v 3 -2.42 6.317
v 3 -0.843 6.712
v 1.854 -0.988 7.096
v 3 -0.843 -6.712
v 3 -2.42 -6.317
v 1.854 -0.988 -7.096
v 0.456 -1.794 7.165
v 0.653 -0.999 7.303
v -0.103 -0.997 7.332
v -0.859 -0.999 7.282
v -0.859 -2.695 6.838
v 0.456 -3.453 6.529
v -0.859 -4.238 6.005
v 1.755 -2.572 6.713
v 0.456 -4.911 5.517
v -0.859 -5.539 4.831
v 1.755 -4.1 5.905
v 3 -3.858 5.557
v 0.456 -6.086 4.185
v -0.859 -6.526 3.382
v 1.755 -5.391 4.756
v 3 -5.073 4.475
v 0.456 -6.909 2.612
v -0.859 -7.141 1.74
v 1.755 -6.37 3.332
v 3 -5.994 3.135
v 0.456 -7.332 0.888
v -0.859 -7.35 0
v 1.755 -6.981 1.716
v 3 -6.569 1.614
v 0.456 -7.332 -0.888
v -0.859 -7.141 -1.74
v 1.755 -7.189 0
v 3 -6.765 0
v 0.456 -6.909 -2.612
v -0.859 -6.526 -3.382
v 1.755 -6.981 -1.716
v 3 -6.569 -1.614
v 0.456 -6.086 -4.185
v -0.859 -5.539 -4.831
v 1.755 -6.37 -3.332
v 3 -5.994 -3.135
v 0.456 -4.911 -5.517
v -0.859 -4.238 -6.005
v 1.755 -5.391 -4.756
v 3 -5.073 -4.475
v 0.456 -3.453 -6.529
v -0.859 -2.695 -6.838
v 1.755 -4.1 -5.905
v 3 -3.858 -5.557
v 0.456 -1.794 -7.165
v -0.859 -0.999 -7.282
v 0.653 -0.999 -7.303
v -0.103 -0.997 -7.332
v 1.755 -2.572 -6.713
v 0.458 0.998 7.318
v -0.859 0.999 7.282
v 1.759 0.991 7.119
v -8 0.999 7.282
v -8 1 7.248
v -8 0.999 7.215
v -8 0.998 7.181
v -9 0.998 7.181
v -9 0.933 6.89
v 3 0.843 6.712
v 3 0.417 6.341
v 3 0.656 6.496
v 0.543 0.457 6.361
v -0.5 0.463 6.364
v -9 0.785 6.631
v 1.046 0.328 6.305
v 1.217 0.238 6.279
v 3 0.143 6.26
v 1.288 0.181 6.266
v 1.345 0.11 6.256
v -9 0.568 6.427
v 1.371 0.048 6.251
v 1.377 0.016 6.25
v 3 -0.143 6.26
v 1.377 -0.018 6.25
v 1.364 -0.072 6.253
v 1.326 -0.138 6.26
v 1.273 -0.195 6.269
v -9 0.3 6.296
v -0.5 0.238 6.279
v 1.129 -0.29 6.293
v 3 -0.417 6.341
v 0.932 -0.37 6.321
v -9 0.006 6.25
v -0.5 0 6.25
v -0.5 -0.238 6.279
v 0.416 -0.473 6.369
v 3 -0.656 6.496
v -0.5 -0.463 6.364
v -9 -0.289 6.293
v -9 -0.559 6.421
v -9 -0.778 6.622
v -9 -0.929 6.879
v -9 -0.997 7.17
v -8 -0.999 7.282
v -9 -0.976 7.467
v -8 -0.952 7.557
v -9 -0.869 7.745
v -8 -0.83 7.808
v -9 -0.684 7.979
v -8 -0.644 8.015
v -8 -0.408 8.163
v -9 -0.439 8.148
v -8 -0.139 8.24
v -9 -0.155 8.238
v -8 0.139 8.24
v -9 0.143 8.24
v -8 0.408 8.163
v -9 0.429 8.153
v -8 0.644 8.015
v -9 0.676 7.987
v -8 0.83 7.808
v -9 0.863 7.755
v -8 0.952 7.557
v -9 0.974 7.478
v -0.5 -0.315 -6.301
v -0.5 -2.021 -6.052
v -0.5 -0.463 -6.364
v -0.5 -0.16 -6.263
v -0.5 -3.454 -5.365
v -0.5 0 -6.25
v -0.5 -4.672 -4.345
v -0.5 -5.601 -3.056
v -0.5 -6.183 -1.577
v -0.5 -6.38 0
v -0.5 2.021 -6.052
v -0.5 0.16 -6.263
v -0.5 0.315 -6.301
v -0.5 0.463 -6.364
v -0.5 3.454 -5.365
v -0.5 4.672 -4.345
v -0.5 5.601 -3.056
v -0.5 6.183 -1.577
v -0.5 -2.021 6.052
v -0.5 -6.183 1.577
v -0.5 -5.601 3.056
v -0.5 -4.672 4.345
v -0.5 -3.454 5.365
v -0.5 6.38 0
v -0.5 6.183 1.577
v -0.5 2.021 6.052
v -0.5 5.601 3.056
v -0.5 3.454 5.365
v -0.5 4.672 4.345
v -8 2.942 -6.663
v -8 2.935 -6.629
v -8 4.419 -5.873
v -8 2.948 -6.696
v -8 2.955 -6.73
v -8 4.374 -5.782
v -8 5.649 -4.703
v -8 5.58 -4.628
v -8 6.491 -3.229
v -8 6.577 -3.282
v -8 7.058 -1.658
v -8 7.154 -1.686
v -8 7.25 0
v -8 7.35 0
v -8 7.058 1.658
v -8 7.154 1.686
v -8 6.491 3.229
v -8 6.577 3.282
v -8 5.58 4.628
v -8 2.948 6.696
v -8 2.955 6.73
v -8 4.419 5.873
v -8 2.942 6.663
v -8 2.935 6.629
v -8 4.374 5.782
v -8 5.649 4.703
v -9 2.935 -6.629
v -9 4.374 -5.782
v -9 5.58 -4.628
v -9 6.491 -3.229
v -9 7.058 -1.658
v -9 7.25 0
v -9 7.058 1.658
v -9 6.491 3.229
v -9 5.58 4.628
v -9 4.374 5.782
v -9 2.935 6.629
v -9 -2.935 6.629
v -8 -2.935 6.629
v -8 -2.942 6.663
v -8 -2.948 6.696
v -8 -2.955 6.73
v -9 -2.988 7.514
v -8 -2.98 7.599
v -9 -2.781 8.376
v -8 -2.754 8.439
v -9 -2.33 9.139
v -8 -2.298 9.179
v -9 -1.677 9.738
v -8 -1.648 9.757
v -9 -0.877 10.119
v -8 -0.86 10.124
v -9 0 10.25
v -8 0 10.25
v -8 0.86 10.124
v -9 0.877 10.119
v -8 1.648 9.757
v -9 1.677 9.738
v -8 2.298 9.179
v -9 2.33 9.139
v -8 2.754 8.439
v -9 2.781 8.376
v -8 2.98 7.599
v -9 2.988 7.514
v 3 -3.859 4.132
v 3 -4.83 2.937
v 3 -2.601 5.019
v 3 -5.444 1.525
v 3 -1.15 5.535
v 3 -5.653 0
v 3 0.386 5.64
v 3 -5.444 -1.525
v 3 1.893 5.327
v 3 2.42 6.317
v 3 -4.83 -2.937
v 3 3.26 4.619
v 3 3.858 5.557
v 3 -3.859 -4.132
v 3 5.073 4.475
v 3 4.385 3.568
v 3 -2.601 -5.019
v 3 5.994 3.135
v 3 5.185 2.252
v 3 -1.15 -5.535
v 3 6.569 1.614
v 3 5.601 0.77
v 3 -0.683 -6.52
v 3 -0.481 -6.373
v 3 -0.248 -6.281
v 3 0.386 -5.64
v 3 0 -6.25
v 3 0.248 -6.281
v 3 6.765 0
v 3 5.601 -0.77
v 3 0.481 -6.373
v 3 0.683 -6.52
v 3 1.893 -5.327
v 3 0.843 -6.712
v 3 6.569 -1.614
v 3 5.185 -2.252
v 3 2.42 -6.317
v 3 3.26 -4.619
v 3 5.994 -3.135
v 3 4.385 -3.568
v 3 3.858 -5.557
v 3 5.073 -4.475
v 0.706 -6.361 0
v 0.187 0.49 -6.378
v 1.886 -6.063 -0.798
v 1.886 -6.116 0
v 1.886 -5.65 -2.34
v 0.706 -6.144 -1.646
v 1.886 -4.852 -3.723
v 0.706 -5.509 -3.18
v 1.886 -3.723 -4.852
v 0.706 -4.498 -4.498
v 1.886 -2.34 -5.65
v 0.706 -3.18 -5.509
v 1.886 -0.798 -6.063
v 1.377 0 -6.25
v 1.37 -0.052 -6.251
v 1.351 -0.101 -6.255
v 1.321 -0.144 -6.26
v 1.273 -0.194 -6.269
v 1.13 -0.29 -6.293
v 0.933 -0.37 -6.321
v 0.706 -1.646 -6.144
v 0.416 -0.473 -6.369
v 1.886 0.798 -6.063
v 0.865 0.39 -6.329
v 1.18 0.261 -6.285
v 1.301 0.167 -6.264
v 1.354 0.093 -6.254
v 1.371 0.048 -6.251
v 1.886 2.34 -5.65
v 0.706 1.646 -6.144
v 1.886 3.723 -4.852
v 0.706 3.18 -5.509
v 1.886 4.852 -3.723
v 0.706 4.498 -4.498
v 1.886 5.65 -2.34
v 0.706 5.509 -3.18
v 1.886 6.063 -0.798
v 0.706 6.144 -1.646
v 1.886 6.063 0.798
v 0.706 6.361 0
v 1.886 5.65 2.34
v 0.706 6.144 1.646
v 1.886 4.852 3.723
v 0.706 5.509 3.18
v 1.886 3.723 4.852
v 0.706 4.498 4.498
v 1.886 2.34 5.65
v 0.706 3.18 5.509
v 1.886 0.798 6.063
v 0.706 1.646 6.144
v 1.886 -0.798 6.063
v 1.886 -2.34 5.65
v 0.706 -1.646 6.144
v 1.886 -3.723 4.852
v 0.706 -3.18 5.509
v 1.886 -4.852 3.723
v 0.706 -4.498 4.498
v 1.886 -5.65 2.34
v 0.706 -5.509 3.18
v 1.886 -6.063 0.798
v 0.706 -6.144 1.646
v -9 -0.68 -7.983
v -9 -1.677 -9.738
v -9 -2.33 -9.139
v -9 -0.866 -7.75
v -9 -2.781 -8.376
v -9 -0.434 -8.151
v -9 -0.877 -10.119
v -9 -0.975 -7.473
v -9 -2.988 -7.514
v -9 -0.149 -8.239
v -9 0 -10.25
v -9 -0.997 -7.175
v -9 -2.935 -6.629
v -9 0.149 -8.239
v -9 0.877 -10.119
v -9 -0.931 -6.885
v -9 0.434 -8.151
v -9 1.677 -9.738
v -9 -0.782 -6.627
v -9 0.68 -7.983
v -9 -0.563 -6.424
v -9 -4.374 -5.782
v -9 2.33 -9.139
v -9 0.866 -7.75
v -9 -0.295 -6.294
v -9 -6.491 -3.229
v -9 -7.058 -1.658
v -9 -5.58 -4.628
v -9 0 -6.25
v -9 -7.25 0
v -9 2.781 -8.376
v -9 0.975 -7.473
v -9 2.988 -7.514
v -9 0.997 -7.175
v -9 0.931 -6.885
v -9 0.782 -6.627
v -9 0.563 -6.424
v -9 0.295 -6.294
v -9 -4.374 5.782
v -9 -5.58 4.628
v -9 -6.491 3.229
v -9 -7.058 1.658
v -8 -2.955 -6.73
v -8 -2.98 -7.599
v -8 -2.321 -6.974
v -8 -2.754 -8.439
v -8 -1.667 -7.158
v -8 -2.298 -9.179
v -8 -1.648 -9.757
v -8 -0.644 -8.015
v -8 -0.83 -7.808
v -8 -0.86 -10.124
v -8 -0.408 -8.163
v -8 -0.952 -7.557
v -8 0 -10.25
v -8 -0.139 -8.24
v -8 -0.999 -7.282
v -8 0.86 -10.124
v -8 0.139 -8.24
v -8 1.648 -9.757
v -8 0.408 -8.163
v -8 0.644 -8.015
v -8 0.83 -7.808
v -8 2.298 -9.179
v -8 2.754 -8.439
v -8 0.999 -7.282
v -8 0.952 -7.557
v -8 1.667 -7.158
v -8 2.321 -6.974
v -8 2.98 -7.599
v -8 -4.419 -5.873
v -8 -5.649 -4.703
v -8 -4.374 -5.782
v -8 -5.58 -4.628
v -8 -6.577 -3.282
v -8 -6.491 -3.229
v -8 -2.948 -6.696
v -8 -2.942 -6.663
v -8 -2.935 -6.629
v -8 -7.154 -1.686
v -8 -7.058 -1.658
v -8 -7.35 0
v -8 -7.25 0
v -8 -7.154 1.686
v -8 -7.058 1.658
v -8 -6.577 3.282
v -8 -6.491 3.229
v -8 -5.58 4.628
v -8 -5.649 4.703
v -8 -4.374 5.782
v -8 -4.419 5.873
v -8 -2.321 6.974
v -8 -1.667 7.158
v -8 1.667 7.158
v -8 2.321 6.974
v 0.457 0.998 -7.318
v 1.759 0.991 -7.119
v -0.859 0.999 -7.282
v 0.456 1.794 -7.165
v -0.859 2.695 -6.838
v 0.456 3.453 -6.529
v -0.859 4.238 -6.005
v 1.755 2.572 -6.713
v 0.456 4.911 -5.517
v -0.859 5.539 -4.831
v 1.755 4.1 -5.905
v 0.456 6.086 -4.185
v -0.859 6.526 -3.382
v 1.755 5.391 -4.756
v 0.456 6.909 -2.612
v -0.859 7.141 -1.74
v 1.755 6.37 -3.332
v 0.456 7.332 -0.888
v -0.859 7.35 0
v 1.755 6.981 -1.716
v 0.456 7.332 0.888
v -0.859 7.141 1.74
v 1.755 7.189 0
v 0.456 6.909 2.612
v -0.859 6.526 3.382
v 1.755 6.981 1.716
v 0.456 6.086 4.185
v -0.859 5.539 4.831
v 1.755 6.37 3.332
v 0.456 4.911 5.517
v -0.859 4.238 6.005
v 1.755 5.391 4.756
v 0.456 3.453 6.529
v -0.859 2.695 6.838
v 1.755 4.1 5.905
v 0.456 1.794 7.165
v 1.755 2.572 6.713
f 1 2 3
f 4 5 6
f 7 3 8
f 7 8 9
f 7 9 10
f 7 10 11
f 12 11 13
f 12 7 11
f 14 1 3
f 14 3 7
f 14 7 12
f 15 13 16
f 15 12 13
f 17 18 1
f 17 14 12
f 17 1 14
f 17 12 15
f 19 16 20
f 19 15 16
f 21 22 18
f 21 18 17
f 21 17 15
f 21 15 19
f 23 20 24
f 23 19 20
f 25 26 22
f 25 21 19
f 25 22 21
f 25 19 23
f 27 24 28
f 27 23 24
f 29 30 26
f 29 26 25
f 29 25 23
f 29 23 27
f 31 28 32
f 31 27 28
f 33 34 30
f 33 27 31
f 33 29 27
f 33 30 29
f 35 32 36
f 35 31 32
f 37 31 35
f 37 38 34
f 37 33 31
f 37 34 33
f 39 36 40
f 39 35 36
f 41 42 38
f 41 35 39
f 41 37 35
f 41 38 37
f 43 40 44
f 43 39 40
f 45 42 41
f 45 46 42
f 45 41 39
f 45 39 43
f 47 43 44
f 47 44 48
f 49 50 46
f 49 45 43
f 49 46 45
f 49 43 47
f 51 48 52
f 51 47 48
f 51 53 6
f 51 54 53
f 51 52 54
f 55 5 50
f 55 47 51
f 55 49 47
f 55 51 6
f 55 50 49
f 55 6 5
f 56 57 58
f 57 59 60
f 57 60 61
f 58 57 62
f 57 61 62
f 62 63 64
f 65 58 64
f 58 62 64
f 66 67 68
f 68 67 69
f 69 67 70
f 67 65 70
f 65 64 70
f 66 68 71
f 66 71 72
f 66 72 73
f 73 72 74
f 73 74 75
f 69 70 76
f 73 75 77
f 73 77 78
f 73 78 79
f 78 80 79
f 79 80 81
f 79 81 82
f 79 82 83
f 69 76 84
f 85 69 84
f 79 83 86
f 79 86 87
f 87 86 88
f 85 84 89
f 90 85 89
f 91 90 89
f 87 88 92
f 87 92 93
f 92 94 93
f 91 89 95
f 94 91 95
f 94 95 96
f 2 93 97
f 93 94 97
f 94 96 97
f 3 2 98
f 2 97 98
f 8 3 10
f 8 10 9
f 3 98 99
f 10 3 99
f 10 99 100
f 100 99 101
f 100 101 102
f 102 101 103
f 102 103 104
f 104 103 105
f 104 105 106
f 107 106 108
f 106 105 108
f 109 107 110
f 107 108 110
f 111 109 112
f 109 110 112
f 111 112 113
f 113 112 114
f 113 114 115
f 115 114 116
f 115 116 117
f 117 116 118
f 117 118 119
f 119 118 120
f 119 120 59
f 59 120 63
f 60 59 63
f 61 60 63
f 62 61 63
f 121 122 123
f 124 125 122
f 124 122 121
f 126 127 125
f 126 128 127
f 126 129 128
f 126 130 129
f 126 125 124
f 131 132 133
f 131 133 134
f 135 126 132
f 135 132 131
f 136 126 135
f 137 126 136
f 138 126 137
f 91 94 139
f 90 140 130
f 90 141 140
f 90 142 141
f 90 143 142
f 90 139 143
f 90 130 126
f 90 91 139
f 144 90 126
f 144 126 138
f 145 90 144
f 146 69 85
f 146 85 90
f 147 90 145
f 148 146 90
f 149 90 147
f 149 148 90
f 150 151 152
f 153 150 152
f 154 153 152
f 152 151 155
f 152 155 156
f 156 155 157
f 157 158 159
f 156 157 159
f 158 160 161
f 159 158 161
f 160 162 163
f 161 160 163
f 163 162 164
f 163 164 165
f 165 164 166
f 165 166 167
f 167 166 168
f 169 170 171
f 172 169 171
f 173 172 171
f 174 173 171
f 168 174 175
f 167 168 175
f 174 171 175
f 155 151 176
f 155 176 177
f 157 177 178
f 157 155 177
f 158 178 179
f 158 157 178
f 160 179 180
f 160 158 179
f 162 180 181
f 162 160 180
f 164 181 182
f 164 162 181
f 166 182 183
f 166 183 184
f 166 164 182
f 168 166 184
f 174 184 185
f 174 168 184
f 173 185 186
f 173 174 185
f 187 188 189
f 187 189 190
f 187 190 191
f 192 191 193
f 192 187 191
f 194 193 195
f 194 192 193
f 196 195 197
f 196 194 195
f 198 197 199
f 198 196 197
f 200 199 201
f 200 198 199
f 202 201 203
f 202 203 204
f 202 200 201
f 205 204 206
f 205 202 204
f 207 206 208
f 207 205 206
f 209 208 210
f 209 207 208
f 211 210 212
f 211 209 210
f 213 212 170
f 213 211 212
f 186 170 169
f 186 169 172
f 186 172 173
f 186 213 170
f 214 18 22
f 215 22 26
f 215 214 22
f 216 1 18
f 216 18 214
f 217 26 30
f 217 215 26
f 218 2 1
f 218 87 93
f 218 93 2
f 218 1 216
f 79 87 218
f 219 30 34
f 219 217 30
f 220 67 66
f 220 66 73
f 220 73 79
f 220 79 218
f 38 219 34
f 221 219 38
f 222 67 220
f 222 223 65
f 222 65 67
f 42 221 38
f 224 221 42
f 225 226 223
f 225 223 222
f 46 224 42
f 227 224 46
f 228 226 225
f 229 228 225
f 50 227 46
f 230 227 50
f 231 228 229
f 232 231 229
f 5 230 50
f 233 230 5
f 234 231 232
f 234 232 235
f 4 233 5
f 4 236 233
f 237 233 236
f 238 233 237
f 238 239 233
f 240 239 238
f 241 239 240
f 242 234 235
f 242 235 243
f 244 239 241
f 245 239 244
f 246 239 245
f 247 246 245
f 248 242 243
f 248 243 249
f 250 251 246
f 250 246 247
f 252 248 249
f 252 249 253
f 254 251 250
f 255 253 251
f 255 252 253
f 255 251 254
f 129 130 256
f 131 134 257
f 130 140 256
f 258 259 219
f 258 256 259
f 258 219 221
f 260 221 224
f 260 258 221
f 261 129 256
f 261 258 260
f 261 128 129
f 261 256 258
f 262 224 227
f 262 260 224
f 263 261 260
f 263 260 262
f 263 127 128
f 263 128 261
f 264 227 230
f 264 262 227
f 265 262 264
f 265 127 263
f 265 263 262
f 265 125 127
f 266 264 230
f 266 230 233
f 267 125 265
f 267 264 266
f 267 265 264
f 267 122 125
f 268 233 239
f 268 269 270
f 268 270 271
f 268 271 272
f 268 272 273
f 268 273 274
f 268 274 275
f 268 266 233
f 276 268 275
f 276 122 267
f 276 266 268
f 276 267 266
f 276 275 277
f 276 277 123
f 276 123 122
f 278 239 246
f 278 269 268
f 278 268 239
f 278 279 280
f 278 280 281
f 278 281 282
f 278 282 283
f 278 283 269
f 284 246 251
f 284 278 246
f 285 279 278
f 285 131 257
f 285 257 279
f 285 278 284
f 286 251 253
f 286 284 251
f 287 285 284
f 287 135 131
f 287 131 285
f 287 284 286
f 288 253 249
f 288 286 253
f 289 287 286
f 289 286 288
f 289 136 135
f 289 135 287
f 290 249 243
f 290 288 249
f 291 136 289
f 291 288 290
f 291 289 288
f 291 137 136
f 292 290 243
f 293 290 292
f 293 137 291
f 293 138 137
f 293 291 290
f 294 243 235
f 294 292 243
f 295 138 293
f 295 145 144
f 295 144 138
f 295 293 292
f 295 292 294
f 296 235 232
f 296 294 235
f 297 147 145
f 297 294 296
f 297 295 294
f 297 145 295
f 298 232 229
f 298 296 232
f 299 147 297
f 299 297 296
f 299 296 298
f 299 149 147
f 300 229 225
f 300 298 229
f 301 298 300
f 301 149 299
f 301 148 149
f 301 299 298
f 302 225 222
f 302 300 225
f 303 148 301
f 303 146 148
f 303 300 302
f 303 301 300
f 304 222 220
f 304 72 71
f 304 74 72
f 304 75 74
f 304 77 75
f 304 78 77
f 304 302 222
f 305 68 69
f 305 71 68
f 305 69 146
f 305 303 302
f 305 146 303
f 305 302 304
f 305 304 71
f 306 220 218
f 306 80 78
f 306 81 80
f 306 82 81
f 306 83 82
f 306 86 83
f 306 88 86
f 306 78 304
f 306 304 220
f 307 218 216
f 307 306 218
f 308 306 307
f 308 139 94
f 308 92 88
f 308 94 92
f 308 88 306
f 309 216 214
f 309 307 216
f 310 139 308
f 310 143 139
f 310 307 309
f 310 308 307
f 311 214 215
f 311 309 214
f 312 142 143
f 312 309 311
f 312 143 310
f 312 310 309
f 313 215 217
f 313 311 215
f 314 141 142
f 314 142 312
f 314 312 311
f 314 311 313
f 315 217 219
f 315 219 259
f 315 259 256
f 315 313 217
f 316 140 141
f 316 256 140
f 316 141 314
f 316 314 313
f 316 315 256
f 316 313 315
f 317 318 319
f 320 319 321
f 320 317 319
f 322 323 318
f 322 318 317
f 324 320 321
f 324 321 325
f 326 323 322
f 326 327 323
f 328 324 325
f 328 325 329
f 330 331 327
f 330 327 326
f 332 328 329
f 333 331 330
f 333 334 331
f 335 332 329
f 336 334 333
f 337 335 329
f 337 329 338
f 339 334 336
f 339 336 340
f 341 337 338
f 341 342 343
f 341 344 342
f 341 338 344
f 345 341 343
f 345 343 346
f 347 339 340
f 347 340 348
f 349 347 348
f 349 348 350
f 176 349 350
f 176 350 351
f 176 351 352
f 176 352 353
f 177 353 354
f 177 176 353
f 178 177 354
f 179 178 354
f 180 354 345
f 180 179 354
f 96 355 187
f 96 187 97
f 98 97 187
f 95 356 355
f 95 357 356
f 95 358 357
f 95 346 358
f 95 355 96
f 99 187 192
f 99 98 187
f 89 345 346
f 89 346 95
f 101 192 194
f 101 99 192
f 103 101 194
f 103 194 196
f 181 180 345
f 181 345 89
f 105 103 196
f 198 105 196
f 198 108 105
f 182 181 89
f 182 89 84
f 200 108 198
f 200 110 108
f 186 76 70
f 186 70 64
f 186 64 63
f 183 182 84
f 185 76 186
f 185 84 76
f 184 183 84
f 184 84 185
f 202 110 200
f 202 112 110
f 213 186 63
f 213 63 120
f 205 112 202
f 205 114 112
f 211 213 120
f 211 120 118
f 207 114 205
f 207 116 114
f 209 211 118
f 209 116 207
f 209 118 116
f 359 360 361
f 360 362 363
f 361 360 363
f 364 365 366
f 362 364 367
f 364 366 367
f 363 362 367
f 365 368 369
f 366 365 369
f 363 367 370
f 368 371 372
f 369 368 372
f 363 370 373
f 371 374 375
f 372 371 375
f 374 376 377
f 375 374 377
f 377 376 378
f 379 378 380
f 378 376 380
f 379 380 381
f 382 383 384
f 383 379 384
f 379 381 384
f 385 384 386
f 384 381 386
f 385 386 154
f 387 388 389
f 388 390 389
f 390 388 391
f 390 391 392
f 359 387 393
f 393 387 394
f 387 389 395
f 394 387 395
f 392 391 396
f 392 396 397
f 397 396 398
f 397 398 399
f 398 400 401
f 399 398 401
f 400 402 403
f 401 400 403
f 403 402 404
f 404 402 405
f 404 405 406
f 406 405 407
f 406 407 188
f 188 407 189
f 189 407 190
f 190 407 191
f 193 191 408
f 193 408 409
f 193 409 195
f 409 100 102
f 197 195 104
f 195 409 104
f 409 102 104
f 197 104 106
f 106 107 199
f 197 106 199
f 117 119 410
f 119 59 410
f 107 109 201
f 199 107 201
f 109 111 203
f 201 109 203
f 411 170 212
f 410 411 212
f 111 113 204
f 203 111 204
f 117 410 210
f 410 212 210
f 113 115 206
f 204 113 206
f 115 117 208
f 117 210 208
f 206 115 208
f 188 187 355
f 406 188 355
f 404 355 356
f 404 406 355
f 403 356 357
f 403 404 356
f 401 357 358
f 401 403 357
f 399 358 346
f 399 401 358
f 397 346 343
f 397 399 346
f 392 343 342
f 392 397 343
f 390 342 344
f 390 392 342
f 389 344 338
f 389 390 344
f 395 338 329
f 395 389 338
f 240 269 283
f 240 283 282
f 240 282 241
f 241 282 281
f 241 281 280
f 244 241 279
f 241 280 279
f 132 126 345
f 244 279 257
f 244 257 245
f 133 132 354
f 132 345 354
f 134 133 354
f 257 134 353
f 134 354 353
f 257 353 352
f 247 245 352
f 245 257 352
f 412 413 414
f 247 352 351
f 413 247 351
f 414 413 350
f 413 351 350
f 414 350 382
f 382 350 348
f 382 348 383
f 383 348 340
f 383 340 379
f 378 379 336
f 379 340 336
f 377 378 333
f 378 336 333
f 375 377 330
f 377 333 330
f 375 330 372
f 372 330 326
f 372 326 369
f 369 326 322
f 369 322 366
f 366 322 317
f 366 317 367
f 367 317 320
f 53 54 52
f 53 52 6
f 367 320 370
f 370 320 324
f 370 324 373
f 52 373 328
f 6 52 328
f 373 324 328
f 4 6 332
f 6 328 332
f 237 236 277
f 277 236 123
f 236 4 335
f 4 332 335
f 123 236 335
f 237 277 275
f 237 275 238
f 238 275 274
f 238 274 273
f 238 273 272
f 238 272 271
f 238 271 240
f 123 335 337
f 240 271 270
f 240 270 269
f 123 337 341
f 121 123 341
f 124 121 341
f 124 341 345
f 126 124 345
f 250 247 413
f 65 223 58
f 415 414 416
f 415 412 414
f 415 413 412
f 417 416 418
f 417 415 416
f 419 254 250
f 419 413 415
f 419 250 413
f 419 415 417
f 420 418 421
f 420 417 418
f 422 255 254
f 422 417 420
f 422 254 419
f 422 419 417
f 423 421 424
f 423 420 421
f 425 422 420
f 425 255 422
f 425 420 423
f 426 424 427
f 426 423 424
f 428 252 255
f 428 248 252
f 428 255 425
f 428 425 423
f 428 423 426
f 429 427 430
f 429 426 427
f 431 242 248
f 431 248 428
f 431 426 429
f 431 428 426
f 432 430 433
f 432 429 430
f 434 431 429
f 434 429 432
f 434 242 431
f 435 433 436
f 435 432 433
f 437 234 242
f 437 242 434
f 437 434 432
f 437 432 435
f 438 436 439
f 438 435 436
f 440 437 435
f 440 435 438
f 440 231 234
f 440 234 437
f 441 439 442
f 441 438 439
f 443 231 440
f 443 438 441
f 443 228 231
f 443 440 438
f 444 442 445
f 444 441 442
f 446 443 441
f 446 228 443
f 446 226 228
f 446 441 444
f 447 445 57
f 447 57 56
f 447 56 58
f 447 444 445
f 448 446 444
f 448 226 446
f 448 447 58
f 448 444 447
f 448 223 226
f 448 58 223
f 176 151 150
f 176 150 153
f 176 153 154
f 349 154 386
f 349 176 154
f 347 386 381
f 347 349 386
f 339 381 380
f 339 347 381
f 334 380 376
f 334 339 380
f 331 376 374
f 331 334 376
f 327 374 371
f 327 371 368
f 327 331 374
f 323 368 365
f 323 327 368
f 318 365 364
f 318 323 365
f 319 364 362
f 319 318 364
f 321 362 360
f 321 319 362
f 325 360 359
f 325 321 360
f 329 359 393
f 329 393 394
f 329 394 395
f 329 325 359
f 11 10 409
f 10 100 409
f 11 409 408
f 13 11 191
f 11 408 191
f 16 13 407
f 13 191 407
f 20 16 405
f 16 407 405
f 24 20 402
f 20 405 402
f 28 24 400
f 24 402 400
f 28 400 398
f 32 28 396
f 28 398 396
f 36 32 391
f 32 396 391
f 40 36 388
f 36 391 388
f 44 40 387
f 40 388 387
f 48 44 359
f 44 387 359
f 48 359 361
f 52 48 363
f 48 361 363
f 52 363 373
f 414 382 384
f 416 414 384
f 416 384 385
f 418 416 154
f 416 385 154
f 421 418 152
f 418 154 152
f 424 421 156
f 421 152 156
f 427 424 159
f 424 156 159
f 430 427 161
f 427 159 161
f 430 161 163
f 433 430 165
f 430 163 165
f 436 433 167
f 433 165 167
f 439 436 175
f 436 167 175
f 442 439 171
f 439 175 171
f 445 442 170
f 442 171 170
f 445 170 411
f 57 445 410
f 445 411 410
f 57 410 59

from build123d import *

# Parameters (mm, degrees)
ENL_V_START             = 3
ESQUISSE2_W             = 20.168692272
ESQUISSE2_H             = 19.901202985
ENL_V_MAT_EXTRU_1_DEPTH = 10
BOSS_EXTRU_1_START      = -11
ESQUISSE3_R             = 7.25
BOSS_EXTRU_1_DEPTH      = 1
ESQUISSE4_R             = 7.35
BOSS_EXTRU_2_DEPTH      = 7.5
ESQUISSE5_R             = 3
ESQUISSE5_R_2           = 1
BOSS_EXTRU_3_DEPTH      = 1
ESQUISSE6_R             = 1
ENL_V_MAT_EXTRU_2_DEPTH = 18.430504869


with BuildPart() as part:
    # Esquisse1 → Révolution1 (revolve)
    with BuildSketch(Plane.XY):
        with BuildLine():
            ThreePointArc((-6.4, 0), (0, 6.4), (6.4, 0))
            Line((6.4, 0), (7.4, 0))
            ThreePointArc((7.4, 0), (0, 7.4), (-7.4, 0))
            Line((-7.4, 0), (-6.4, 0))
        make_face()
    revolve(axis=Axis((-7.4, 0, 0), (1, 0, 0)))

    # Esquisse2 → Enlèv. mat.-Extru.1 (cut)
    with BuildSketch(Plane(origin=(0, 0, 0), x_dir=(0, 0, -1), z_dir=(1, 0, 0)).offset(ENL_V_START)):
        with Locations((-0.294238216, 0.080246787)):
            Rectangle(ESQUISSE2_W, ESQUISSE2_H)
    extrude(amount=ENL_V_MAT_EXTRU_1_DEPTH, mode=Mode.SUBTRACT)



with BuildPart() as body_2:
    # Esquisse3 → Boss.-Extru.1 (new body)
    with BuildSketch(Plane(origin=(3, 0, 0), x_dir=(0, 0, -1), z_dir=(1, 0, 0)).offset(BOSS_EXTRU_1_START)):
        Circle(ESQUISSE3_R)
    extrude(amount=-BOSS_EXTRU_1_DEPTH)


with BuildPart() as part_1:
    add(part.part)

    add(body_2.part)  # Boss.-Extru.2 merges body 2
    # Esquisse4 → Boss.-Extru.2 (add)
    with BuildSketch(Plane(origin=(-8, 0, 0), x_dir=(0, 0, -1), z_dir=(1, 0, 0))):
        Circle(ESQUISSE4_R)
    extrude(amount=BOSS_EXTRU_2_DEPTH)

    # Esquisse5 → Boss.-Extru.3 (add)
    # profile 1 of 2: a face of its own
    with BuildSketch(Plane.ZY.offset(9)):
        with Locations((7.25, 0)):
            Circle(ESQUISSE5_R)
        with Locations((7.25, 0)):
            Circle(ESQUISSE5_R_2, mode=Mode.SUBTRACT)
    # profile 2 of 2: a face of its own
    with BuildSketch(Plane.ZY.offset(9)):
        with Locations((-7.25, 0)):
            Circle(ESQUISSE5_R)
        with Locations((-7.25, 0)):
            Circle(ESQUISSE5_R_2, mode=Mode.SUBTRACT)
    extrude(amount=-BOSS_EXTRU_3_DEPTH)

    # Esquisse6 → Enlèv. mat.-Extru.2 (cut, through all)
    with BuildSketch(Plane.ZY.offset(9)):
        with Locations((-7.25, 0)):
            Circle(ESQUISSE6_R)
        with Locations((7.25, 0)):
            Circle(ESQUISSE6_R)
    extrude(amount=-ENL_V_MAT_EXTRU_2_DEPTH, mode=Mode.SUBTRACT)


solid = part_1.part
